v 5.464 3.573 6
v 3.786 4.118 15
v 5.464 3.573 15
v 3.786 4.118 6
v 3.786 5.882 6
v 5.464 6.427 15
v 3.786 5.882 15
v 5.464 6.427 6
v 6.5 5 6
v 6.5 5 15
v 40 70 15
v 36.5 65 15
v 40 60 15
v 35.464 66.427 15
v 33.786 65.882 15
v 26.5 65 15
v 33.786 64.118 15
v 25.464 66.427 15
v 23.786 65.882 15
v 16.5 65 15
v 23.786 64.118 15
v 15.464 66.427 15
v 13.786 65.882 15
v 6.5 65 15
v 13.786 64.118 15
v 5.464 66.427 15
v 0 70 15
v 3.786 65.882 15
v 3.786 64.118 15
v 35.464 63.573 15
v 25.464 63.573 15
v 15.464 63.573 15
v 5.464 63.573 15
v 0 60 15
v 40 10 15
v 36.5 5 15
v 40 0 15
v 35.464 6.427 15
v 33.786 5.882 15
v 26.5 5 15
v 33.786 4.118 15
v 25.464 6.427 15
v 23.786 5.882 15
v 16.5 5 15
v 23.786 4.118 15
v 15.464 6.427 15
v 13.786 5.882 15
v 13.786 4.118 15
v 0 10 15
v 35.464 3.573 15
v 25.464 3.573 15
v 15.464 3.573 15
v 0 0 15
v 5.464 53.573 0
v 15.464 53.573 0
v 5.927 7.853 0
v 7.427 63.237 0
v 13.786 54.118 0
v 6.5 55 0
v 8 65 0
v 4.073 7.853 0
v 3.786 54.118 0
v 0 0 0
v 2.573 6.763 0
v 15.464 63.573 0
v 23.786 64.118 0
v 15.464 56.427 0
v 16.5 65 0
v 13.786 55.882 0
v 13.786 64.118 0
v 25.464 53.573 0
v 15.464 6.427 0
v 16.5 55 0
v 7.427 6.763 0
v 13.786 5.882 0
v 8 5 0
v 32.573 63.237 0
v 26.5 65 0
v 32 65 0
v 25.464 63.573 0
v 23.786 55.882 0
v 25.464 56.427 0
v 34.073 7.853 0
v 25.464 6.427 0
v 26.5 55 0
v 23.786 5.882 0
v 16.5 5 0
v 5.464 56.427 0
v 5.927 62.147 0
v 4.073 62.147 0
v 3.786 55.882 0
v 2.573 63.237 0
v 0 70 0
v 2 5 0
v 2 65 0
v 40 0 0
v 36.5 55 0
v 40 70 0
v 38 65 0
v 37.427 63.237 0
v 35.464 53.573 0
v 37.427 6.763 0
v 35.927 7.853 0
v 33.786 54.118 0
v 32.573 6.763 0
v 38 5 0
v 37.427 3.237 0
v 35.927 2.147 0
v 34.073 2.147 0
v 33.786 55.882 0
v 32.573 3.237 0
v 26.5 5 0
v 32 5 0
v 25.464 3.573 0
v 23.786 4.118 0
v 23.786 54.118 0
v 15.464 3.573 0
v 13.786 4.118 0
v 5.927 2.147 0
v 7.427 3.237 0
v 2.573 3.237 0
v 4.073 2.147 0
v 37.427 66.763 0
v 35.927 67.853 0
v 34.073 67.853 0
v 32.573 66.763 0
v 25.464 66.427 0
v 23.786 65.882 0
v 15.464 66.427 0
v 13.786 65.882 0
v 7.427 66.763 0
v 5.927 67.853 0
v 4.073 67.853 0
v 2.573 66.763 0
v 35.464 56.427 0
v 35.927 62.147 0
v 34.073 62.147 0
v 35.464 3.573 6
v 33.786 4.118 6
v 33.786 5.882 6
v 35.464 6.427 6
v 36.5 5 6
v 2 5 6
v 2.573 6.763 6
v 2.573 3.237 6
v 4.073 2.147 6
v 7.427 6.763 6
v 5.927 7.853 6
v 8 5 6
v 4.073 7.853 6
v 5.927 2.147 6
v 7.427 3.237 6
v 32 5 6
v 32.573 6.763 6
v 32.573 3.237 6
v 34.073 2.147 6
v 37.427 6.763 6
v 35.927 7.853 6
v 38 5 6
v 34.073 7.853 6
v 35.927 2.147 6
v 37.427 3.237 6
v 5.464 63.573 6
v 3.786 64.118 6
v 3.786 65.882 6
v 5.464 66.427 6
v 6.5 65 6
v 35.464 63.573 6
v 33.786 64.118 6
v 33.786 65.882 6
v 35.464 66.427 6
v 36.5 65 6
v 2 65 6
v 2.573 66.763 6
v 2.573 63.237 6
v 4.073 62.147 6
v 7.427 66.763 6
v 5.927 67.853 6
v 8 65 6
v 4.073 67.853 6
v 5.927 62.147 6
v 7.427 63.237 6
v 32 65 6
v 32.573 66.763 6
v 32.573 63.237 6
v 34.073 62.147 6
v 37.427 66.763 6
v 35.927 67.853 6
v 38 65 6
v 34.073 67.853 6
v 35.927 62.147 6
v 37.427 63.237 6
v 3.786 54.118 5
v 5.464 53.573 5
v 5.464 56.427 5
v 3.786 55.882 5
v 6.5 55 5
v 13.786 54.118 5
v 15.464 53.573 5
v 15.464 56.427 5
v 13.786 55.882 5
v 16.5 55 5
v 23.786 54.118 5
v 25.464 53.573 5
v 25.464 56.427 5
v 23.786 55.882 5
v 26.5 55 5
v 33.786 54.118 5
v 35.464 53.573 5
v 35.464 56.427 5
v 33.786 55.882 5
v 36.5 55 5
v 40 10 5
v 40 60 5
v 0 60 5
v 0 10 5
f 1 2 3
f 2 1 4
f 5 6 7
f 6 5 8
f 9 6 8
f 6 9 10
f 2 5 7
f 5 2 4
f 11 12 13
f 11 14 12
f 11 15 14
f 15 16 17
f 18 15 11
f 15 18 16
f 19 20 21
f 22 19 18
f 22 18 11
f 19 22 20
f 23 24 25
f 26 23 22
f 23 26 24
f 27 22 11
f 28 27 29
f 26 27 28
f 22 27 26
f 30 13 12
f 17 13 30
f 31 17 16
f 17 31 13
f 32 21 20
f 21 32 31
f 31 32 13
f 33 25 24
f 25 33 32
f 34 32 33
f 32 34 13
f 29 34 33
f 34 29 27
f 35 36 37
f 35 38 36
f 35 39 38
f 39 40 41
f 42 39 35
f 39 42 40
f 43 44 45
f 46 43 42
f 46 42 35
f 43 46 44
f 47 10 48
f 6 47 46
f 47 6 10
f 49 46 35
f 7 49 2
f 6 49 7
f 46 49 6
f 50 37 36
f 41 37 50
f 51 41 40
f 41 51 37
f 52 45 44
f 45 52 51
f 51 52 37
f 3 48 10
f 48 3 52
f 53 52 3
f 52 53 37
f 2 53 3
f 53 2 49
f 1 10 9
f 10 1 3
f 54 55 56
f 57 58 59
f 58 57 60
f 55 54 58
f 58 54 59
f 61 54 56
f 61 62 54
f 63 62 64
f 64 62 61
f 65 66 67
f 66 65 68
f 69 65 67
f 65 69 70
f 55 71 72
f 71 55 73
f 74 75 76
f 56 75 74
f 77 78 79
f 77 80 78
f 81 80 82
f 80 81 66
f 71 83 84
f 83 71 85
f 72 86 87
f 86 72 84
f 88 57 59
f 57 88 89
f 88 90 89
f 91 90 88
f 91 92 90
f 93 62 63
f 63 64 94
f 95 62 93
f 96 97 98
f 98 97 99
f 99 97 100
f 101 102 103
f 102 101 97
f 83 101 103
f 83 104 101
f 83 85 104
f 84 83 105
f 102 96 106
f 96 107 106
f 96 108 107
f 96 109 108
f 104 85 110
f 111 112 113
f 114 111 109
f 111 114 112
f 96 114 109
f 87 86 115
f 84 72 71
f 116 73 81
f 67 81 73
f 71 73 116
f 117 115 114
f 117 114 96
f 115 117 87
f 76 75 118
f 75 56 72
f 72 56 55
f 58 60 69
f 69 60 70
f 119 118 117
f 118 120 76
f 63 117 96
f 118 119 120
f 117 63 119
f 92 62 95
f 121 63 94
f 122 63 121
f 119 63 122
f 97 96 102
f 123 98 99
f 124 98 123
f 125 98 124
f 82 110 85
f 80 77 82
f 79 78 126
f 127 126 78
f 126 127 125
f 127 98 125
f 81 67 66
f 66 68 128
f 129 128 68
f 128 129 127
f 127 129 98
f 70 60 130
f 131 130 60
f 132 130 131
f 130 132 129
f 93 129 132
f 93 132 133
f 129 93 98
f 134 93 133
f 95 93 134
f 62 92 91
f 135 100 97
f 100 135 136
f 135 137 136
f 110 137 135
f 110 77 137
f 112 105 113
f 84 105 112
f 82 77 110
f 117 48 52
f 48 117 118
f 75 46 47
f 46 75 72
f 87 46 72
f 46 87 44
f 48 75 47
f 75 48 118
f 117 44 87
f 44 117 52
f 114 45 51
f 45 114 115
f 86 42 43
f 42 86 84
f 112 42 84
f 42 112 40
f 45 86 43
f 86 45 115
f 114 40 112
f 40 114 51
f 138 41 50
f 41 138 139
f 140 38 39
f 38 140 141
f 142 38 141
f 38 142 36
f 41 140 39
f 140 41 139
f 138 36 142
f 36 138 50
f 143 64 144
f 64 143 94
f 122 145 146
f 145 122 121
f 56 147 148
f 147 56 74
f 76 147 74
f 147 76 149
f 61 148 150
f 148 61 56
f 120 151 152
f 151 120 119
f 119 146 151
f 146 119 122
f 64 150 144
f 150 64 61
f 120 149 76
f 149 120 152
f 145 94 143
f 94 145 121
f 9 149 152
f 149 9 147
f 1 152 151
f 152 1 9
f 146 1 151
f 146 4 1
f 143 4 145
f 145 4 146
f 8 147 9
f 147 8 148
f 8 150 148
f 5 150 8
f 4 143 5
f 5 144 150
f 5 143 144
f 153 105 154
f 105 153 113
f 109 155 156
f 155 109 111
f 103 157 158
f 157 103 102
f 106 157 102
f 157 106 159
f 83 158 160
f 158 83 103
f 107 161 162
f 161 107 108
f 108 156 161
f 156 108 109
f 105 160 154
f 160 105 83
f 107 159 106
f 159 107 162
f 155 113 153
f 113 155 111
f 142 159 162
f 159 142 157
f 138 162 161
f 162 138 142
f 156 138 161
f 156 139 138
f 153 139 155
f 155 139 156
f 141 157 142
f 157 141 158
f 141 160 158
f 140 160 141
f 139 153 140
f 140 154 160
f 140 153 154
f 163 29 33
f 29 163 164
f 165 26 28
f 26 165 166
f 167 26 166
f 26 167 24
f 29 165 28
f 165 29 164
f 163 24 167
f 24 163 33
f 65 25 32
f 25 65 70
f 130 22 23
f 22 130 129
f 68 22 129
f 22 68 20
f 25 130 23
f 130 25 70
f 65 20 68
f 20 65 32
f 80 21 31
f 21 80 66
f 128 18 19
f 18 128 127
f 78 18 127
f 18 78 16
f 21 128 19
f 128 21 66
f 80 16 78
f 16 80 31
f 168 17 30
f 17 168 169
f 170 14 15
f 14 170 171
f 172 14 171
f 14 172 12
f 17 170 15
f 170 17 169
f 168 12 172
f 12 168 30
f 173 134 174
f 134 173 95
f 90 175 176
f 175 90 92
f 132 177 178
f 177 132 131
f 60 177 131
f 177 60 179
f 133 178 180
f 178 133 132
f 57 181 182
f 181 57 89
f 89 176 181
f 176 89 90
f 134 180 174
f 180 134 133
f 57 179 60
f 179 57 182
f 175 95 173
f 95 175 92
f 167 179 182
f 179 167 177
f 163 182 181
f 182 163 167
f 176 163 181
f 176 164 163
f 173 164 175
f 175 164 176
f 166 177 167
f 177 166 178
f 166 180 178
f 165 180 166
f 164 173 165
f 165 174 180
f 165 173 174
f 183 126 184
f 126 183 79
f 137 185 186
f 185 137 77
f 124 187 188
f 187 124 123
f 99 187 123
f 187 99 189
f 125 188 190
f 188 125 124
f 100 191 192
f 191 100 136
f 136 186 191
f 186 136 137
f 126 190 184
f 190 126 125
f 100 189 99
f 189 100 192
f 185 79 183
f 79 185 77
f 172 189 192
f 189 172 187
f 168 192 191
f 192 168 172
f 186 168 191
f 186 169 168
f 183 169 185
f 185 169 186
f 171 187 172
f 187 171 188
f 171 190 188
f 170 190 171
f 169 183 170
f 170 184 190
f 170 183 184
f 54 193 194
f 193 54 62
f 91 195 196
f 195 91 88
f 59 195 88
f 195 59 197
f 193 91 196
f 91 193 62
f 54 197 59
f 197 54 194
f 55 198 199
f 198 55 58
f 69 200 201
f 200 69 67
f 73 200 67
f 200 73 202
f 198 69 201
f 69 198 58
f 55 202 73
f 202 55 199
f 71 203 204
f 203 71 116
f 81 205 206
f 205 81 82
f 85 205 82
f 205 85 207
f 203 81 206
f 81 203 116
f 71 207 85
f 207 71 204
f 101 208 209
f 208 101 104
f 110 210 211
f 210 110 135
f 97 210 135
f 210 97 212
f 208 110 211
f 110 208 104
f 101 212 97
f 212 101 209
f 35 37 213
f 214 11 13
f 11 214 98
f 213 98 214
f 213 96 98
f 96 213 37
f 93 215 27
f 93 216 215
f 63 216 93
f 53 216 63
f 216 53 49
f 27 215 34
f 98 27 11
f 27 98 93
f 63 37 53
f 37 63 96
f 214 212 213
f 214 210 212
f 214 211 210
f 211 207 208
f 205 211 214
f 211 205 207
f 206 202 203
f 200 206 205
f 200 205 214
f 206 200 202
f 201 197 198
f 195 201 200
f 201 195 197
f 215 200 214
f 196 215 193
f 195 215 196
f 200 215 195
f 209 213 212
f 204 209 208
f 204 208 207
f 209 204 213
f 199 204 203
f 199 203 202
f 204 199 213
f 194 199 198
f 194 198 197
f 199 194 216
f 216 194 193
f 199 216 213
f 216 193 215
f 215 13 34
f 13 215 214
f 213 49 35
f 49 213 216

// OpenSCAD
difference() {
	union() {
		cube([40, 70, 15]);
	}

	translate([0, 10, 5])
		cube([40, 50, 10]);

	for(y = [5, 65]) {
		for(x = [5:10:35])
			translate([x, y, 0])
				cylinder(d = 3, h = 15);
		for(x = [5, 35])
			translate([x, y, 0])
				cylinder(d = 6, h = 6);
	}
	for(x = [5:10:35])
		translate([x, 55, 0])
			cylinder(d = 3, h = 10);
}
